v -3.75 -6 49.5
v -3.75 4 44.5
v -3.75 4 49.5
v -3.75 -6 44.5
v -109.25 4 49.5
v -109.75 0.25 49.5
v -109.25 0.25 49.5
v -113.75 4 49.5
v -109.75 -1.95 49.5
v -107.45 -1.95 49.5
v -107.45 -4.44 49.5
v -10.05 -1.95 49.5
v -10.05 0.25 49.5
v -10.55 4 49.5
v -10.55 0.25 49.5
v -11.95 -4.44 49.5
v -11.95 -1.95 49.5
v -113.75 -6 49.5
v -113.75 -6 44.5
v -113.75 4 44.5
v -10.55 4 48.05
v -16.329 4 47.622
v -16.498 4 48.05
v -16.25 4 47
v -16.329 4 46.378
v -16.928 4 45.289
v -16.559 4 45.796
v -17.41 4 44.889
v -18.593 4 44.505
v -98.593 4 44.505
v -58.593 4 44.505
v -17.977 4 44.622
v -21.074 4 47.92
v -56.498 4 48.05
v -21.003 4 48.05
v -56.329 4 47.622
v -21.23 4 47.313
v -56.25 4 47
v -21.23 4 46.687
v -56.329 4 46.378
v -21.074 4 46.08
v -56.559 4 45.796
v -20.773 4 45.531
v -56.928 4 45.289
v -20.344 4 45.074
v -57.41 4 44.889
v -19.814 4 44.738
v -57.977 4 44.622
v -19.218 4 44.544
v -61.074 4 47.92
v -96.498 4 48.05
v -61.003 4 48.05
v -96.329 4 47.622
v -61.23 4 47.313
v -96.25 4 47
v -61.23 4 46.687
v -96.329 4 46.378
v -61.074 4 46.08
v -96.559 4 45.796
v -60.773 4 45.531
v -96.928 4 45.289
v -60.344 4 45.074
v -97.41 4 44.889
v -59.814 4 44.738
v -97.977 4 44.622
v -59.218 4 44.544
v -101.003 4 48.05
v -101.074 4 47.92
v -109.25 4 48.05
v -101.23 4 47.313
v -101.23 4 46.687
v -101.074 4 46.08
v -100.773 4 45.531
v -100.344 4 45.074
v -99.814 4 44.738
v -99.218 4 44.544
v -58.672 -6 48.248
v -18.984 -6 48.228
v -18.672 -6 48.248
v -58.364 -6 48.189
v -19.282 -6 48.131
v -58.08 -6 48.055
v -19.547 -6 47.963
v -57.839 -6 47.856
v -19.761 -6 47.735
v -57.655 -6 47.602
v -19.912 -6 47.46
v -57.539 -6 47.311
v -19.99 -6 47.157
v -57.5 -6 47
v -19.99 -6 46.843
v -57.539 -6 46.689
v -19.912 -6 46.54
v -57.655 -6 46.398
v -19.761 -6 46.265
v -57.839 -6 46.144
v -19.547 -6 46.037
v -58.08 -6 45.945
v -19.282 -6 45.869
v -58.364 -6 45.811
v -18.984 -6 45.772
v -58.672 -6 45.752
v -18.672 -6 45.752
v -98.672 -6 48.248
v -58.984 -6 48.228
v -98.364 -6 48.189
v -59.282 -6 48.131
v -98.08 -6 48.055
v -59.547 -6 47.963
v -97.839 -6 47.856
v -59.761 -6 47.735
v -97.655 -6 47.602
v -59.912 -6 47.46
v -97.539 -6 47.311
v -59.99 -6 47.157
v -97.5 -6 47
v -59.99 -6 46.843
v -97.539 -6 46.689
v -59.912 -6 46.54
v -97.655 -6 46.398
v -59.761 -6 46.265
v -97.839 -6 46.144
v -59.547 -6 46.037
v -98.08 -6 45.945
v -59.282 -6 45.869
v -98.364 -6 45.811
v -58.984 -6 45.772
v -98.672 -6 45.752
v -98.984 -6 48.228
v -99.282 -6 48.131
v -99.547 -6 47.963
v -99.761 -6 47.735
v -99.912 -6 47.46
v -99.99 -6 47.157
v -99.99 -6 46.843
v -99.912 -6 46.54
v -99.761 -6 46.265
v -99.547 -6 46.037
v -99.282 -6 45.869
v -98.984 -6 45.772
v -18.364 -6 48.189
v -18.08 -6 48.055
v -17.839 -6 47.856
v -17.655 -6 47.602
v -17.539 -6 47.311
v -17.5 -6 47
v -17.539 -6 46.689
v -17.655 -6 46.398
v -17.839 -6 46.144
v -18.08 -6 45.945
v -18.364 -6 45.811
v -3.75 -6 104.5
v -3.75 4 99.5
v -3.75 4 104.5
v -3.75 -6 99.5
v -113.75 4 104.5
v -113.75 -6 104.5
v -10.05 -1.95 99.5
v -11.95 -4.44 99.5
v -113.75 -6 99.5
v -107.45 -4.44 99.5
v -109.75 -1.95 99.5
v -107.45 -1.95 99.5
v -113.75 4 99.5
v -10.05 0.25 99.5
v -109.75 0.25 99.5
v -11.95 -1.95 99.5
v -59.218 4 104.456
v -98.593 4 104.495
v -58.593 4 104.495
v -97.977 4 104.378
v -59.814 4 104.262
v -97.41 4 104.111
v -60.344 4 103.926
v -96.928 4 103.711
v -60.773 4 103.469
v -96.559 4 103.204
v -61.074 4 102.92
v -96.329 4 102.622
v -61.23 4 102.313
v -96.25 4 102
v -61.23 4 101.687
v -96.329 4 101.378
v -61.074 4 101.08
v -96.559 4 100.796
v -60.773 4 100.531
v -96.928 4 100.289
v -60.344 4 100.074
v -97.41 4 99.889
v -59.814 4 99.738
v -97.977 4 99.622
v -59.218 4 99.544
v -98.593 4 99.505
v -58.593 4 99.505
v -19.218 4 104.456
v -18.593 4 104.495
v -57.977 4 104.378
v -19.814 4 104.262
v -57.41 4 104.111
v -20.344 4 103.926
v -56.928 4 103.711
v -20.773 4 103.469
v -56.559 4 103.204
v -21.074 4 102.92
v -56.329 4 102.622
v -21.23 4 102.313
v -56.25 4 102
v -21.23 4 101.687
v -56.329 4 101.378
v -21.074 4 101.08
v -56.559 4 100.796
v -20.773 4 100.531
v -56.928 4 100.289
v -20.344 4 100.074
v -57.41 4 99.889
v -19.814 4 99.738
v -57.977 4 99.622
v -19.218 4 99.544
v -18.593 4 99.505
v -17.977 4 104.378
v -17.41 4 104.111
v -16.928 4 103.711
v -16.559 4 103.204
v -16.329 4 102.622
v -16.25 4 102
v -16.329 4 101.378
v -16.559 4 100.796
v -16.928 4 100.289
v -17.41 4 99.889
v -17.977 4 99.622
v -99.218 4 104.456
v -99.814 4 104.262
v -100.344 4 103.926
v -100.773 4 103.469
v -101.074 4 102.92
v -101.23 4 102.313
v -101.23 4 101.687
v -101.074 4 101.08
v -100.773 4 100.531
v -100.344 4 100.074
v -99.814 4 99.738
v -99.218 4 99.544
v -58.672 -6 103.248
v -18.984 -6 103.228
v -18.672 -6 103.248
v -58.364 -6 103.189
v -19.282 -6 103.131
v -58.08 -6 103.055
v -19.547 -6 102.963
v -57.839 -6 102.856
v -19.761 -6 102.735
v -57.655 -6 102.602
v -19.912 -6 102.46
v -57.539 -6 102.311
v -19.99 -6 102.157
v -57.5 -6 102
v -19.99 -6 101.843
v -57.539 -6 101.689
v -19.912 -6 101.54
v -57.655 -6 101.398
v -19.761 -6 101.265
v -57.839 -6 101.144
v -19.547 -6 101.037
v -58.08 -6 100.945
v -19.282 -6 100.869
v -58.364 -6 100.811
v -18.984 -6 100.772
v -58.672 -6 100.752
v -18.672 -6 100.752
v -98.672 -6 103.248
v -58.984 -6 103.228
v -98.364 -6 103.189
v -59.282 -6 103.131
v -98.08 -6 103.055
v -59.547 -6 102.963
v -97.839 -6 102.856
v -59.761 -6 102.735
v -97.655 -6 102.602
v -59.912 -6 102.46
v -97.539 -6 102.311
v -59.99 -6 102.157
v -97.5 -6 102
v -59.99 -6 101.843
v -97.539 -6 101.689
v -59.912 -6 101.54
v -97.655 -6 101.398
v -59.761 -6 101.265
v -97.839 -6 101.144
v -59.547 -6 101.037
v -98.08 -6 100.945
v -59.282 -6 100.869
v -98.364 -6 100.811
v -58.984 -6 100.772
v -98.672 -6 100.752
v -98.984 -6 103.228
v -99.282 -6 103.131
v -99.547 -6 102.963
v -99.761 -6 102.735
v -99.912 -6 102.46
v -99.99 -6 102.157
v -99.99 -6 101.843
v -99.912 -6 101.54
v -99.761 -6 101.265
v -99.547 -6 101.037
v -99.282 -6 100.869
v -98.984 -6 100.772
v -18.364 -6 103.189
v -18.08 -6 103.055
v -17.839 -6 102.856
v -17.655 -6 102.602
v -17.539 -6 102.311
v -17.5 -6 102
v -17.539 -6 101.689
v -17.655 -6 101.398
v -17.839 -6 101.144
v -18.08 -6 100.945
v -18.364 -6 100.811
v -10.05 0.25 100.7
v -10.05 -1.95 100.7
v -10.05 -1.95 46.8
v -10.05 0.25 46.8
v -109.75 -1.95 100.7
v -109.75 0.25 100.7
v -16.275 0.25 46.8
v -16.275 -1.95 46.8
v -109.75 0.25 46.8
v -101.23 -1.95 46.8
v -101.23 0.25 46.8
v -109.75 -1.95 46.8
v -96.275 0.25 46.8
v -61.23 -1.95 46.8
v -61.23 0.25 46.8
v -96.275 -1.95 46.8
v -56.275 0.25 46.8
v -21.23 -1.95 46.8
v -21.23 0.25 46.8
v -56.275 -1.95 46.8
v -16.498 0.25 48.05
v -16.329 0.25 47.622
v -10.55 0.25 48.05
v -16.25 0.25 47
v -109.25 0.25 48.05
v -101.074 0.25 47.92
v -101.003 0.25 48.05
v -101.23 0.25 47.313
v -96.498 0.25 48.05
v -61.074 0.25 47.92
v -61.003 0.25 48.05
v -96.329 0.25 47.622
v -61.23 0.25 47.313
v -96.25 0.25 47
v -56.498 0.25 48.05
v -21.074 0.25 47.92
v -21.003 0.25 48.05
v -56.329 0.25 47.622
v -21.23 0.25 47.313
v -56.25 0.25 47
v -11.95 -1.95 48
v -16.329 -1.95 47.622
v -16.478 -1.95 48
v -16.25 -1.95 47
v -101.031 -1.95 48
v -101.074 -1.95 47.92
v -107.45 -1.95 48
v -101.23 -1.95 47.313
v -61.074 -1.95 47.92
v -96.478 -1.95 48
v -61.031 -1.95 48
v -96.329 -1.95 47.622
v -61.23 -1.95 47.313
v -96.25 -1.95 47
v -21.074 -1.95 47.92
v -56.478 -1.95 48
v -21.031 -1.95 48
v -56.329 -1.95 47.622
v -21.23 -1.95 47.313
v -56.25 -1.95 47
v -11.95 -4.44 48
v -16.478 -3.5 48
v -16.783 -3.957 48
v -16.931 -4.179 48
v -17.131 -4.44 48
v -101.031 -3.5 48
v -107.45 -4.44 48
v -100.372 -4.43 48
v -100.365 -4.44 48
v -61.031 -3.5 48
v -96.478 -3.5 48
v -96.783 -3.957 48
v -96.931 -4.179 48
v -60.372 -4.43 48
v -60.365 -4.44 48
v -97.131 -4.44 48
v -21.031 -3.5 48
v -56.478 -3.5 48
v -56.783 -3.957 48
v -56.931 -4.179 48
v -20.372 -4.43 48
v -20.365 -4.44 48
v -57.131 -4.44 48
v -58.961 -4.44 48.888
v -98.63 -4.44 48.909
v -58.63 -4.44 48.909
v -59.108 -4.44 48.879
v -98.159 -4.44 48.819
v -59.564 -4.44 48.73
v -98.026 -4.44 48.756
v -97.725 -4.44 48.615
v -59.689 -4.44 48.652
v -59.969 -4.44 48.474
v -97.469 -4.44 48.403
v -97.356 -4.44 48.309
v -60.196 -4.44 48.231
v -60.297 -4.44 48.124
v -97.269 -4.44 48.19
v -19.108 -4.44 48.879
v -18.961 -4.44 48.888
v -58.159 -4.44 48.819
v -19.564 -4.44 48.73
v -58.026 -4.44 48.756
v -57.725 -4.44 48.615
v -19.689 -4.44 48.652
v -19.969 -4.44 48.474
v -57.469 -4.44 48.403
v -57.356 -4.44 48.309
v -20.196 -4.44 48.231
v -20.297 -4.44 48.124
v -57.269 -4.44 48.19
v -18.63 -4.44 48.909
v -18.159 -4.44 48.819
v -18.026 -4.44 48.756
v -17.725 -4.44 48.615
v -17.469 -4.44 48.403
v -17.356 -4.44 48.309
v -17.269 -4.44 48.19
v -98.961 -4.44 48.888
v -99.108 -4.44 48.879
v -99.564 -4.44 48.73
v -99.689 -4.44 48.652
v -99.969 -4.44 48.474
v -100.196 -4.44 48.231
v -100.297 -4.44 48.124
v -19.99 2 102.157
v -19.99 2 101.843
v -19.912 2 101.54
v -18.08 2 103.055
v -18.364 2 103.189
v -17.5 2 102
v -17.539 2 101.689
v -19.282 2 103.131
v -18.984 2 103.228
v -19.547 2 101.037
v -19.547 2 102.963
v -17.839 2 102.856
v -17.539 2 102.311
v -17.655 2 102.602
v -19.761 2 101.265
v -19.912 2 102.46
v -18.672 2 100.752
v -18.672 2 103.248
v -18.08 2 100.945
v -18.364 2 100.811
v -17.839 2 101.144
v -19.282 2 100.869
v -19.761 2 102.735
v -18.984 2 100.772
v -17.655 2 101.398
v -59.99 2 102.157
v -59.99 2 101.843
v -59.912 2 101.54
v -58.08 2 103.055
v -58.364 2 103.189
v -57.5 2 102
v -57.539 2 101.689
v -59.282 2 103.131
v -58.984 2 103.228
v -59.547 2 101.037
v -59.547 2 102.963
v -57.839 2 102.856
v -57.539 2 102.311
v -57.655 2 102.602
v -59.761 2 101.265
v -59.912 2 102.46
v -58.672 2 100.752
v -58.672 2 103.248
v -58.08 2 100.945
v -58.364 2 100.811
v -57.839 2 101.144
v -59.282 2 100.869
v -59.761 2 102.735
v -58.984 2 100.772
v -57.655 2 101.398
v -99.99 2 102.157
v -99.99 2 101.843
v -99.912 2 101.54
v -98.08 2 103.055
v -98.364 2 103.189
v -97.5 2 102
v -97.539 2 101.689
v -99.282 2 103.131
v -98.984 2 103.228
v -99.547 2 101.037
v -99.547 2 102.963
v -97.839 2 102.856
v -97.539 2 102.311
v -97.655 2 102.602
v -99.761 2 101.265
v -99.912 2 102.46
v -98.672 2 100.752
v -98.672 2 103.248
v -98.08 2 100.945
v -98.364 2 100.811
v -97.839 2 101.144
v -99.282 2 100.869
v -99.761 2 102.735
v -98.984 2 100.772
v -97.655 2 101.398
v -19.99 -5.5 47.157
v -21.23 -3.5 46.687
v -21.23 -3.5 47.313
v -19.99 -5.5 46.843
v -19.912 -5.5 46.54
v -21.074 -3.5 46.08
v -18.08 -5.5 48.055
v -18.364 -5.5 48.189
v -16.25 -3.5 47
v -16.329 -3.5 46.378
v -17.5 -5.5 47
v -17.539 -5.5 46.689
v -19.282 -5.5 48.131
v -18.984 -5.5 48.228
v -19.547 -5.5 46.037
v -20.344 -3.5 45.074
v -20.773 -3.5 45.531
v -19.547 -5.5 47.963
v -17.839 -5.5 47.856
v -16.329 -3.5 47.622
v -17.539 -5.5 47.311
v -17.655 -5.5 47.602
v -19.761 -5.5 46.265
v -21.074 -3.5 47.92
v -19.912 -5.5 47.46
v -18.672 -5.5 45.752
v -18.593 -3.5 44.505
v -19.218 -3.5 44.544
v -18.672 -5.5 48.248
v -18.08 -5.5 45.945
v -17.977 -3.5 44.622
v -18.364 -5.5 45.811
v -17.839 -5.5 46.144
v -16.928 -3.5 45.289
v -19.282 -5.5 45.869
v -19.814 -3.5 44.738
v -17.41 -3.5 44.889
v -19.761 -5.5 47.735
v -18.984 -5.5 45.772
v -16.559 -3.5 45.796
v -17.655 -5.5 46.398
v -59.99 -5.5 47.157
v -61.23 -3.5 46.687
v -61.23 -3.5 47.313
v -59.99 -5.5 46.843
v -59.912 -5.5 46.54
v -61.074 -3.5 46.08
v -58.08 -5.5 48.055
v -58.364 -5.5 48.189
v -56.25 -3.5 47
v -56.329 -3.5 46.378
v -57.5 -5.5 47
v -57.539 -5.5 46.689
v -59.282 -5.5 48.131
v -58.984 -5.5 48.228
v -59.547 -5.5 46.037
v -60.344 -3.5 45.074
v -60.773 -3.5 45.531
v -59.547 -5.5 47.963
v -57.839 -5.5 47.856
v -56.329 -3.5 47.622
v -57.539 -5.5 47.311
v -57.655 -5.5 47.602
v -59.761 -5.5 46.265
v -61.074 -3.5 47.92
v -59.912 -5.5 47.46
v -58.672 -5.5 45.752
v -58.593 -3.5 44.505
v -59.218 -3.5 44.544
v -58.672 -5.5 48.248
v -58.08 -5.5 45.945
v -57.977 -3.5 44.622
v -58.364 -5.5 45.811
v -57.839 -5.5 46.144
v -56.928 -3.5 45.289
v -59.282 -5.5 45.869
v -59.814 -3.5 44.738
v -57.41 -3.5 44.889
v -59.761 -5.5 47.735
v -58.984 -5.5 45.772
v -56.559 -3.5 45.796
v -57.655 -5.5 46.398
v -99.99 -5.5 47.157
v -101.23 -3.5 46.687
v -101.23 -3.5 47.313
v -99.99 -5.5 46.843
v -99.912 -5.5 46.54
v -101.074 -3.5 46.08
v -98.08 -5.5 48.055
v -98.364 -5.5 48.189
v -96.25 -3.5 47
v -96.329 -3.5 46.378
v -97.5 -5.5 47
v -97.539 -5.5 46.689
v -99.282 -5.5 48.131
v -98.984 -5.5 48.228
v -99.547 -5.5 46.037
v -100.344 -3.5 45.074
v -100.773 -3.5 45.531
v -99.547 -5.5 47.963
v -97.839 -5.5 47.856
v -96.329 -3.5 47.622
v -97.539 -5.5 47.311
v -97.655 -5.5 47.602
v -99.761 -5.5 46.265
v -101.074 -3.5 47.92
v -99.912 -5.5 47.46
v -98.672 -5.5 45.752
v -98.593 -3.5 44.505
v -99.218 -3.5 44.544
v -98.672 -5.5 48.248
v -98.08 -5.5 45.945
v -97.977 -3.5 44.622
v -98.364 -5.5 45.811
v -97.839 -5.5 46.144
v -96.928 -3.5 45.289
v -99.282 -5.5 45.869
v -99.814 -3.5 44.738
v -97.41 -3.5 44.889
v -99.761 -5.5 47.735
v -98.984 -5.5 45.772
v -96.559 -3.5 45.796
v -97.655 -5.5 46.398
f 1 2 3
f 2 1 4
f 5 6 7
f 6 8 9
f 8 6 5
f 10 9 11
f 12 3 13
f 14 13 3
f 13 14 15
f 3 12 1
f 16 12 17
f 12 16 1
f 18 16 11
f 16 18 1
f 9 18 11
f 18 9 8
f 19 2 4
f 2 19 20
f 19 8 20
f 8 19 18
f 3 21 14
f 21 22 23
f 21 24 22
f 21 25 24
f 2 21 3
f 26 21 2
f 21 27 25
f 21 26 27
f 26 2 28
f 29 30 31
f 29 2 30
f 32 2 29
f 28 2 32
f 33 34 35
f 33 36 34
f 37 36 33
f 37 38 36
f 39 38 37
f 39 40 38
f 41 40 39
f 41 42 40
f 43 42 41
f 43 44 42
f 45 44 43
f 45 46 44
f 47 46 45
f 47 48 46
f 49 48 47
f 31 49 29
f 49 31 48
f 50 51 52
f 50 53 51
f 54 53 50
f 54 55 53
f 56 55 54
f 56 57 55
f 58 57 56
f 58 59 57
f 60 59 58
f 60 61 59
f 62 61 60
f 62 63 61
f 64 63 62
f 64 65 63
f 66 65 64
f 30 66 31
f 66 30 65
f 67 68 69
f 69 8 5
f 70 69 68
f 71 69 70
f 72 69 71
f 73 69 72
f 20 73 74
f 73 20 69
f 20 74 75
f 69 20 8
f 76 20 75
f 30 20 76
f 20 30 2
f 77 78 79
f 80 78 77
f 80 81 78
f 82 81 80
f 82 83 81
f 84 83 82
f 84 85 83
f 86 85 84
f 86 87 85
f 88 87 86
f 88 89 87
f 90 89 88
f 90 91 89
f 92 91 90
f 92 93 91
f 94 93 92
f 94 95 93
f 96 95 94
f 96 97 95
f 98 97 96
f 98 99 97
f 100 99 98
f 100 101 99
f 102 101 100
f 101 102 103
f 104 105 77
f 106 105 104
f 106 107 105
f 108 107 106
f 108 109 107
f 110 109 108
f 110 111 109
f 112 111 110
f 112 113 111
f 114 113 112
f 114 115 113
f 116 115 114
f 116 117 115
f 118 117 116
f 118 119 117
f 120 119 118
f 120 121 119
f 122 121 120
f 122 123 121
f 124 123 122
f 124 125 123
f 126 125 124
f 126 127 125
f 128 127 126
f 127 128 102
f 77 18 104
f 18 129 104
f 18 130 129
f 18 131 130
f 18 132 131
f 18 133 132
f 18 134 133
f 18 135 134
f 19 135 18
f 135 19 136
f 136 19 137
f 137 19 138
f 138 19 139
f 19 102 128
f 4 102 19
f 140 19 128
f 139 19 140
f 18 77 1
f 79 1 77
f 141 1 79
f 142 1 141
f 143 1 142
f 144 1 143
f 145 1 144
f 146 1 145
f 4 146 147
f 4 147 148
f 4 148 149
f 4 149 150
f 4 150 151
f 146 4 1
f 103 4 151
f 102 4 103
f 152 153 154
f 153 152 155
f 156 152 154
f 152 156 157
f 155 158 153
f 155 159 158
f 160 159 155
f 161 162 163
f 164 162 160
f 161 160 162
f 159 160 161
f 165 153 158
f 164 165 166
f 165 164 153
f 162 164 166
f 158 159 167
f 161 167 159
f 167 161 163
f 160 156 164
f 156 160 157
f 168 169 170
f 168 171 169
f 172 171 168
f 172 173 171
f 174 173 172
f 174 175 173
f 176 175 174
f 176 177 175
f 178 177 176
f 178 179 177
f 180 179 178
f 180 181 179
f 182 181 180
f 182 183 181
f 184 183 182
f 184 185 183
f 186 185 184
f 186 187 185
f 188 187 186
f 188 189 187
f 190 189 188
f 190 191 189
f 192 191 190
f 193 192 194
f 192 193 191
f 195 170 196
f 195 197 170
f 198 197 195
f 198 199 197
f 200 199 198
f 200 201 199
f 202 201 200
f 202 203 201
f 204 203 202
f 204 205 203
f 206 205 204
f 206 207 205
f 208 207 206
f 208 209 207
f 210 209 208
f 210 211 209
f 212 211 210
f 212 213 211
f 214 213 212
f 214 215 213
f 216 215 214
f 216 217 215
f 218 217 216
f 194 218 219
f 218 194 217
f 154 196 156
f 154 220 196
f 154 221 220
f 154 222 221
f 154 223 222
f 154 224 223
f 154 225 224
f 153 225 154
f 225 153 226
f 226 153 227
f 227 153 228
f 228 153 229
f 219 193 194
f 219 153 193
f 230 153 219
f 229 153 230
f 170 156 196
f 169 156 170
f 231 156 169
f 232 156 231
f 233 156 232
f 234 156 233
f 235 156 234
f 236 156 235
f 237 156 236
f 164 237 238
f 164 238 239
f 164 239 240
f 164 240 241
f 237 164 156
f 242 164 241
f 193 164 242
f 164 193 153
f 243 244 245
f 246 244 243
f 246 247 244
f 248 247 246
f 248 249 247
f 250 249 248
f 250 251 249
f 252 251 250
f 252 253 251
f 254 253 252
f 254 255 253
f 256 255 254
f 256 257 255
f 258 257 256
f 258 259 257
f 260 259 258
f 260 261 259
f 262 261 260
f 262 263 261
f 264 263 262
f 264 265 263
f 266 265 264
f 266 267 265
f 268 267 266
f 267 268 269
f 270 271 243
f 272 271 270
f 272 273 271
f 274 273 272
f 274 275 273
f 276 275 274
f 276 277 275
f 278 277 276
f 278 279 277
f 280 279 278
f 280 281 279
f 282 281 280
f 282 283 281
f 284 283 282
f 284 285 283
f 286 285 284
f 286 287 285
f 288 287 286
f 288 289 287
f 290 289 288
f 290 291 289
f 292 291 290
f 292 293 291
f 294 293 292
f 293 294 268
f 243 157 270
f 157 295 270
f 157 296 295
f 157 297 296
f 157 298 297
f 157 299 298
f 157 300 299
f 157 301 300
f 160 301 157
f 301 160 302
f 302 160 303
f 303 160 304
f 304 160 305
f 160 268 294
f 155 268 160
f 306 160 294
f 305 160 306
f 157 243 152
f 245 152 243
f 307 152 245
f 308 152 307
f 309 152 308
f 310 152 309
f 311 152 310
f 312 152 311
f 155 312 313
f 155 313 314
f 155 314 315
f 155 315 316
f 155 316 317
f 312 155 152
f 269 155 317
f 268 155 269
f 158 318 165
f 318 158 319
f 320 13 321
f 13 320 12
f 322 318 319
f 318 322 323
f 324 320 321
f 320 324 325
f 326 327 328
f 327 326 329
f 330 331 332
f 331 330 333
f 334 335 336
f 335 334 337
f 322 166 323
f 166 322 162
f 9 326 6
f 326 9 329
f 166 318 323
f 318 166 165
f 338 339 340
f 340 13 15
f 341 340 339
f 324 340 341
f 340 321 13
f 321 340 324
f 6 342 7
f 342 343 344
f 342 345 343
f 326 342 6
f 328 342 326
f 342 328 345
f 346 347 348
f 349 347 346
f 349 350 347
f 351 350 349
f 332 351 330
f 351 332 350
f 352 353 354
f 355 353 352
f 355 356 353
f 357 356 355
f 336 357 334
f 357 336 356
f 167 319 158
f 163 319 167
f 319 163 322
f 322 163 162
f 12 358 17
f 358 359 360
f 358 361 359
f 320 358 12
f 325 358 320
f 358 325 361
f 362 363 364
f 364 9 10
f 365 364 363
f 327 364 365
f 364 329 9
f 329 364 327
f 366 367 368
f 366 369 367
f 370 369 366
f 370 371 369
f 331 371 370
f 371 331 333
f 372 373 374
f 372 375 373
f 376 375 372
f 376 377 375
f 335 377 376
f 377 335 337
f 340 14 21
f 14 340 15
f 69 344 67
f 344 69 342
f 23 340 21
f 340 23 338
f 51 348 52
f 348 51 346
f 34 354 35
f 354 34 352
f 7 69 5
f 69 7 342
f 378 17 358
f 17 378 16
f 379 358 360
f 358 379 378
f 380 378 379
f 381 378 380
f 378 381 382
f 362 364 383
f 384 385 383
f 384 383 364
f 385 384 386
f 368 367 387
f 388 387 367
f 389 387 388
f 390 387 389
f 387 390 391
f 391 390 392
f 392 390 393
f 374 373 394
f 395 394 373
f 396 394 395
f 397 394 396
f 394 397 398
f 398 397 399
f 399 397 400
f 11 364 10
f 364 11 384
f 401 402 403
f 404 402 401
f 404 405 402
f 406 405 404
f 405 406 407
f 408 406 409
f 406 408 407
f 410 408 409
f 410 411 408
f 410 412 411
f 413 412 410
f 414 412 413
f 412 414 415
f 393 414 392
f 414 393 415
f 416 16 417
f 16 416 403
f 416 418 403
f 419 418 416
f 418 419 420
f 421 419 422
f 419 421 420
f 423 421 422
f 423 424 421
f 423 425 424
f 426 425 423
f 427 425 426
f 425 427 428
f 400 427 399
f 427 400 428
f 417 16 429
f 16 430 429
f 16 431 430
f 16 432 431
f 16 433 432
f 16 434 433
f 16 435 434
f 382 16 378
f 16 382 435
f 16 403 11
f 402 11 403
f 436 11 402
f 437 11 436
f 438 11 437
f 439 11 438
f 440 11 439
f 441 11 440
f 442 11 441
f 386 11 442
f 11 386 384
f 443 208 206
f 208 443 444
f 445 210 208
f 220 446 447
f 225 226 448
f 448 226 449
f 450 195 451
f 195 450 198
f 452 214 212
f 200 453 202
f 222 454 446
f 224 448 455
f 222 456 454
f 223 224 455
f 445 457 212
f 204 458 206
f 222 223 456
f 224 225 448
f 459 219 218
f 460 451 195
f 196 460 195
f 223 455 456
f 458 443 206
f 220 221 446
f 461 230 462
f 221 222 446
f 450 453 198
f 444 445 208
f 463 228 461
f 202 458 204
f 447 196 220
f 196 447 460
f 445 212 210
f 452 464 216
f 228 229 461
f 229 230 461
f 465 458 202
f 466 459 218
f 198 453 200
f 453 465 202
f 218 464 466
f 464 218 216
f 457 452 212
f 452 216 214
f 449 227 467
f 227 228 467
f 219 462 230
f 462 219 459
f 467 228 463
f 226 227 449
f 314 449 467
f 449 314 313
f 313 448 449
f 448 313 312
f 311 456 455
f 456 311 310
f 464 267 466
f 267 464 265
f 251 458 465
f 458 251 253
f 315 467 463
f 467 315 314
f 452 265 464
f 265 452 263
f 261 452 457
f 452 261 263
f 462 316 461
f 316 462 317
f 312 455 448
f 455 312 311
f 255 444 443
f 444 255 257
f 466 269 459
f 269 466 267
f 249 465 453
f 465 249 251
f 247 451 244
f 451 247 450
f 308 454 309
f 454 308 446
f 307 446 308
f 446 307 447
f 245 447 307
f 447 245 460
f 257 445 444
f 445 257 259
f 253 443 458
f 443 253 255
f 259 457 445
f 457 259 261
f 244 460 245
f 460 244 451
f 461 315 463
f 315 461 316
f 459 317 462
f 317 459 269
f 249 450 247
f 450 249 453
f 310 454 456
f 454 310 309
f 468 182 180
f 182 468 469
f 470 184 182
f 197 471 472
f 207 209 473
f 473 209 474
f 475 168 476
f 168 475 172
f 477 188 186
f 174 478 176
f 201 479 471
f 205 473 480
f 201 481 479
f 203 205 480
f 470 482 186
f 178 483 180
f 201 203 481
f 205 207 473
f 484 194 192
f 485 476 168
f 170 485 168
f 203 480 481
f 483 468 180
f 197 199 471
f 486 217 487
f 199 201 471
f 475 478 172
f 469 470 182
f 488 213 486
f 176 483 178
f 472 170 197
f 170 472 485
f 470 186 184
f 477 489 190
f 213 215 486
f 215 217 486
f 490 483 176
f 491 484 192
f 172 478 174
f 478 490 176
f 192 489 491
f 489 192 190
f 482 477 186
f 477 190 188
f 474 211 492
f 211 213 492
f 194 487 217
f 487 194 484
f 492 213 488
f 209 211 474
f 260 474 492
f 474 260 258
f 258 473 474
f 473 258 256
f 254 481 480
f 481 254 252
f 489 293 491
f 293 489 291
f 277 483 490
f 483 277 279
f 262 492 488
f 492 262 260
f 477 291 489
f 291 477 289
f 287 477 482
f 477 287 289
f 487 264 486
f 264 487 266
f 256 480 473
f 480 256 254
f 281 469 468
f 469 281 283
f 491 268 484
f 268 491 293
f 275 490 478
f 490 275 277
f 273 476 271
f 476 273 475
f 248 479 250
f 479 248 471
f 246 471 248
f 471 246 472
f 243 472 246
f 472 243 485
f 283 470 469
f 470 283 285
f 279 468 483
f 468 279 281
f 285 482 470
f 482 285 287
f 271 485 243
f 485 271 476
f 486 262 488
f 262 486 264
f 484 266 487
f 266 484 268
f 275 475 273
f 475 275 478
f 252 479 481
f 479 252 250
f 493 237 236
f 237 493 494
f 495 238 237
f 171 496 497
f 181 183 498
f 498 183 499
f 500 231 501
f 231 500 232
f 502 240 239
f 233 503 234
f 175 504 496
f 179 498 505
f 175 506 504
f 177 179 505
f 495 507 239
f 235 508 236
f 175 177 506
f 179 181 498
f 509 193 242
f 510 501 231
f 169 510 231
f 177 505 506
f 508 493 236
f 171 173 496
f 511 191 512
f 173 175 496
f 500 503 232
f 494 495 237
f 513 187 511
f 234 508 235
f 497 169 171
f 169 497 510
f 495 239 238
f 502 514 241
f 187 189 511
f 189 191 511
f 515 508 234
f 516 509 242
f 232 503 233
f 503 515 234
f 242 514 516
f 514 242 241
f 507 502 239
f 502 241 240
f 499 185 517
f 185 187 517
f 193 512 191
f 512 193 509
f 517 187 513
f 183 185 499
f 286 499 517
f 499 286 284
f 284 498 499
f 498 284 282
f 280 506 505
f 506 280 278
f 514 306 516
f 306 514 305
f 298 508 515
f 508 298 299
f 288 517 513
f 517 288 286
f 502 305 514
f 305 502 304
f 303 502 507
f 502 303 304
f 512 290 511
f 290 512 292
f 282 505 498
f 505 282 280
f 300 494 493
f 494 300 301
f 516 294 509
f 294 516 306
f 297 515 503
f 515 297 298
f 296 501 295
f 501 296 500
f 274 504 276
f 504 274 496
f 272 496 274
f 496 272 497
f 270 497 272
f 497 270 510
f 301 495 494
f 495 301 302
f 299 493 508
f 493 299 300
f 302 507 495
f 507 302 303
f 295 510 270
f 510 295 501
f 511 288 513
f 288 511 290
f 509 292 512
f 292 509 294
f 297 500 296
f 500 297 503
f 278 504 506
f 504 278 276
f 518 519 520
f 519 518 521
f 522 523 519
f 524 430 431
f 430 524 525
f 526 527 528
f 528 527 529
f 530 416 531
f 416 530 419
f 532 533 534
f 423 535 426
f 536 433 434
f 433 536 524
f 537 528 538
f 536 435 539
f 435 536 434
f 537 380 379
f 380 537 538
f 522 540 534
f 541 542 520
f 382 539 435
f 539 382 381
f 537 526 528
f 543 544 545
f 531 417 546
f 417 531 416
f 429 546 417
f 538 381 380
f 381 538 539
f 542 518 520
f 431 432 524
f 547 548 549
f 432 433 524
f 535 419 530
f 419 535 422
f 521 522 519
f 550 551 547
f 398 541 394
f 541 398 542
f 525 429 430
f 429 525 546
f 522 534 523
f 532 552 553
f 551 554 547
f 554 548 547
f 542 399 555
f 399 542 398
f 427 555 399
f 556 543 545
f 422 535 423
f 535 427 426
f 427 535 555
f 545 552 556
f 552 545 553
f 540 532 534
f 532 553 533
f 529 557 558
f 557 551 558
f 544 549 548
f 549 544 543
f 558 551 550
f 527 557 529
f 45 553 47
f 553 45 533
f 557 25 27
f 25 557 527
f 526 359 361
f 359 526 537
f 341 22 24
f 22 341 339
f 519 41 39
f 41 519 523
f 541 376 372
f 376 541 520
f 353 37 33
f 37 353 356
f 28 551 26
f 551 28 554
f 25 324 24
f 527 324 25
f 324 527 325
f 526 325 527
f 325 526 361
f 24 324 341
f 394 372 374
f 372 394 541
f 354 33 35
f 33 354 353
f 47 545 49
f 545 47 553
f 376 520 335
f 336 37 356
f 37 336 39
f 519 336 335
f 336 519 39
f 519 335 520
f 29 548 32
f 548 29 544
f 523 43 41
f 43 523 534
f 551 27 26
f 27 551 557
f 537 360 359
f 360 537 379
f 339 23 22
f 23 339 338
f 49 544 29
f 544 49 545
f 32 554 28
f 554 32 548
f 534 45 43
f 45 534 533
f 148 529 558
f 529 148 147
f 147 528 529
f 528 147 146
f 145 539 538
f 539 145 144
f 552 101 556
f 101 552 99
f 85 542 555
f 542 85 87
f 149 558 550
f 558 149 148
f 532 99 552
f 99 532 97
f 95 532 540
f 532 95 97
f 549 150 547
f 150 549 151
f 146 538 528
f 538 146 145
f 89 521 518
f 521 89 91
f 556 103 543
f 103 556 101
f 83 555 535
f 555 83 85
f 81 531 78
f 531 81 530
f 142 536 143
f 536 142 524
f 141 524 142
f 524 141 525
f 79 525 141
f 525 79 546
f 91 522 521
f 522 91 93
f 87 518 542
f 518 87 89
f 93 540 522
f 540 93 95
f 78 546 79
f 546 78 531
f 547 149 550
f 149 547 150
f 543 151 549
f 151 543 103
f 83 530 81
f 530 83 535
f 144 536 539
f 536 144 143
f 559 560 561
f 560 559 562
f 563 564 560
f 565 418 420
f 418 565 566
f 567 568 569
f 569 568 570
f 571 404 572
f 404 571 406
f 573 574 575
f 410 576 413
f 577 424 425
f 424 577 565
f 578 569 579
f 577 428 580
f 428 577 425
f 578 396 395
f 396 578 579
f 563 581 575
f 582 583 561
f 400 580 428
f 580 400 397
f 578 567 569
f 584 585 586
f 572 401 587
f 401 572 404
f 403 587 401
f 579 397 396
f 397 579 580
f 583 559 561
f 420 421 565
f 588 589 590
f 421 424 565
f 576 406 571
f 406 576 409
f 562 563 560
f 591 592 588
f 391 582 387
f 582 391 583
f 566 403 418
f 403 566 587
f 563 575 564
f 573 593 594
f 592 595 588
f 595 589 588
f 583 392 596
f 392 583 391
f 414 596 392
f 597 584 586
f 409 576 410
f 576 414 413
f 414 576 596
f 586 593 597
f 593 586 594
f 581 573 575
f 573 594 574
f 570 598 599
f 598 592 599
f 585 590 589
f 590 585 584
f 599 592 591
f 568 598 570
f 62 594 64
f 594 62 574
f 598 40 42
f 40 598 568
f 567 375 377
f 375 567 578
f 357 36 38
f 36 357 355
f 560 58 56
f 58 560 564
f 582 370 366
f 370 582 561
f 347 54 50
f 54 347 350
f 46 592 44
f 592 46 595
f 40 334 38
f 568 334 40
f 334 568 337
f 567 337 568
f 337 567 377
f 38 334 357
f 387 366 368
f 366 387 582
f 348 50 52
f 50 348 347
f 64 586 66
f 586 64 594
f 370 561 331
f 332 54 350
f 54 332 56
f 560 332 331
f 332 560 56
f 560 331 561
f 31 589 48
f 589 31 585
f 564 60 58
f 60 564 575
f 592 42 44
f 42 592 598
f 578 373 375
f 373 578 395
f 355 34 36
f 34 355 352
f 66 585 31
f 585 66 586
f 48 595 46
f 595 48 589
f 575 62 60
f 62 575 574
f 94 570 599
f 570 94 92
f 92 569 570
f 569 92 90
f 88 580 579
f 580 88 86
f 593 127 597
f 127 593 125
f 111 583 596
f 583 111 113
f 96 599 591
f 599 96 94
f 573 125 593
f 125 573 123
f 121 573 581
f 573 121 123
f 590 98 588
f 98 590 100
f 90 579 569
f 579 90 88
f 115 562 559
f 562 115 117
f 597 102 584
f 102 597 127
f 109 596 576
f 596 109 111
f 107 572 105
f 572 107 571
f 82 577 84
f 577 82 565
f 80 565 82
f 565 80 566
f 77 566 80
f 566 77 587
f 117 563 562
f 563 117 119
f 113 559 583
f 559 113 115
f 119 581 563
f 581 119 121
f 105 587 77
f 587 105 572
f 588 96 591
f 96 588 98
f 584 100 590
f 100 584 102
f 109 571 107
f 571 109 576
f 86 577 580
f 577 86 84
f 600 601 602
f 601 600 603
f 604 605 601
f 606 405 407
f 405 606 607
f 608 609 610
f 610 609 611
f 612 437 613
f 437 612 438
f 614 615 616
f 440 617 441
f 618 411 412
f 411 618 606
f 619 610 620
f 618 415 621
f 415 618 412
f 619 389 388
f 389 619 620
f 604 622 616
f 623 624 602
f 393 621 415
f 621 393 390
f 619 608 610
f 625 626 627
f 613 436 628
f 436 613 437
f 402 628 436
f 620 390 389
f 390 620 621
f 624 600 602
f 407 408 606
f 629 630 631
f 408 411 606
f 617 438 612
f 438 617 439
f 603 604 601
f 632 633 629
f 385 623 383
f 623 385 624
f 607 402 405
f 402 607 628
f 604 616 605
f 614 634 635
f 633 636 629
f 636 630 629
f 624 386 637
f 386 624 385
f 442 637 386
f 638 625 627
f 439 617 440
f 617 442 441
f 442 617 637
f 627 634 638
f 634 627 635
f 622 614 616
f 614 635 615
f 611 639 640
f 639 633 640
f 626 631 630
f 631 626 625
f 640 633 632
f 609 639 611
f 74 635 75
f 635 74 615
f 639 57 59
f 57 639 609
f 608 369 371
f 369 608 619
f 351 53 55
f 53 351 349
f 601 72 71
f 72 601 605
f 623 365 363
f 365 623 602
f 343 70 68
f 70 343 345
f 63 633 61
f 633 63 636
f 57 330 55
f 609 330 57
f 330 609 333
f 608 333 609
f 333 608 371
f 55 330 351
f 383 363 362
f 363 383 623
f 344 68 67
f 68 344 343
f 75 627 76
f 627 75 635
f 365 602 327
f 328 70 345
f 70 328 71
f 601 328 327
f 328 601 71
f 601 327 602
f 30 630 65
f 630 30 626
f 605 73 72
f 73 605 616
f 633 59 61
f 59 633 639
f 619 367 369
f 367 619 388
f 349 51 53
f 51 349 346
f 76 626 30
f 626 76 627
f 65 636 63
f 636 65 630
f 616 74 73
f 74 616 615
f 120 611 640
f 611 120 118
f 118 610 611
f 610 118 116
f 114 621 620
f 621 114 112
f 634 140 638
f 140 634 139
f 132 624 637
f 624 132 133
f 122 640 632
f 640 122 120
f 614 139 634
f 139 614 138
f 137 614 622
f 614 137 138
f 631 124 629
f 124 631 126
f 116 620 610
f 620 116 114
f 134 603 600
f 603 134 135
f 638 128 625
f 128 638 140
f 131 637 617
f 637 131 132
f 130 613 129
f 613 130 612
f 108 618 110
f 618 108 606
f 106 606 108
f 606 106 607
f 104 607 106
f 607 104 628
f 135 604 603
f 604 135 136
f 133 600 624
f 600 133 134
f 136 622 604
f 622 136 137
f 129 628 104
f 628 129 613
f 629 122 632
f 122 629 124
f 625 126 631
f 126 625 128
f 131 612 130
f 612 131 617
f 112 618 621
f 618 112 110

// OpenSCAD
// file: openscad-extra/src/countersink.scad
/*
Countersink depression for tapered screw heads.
*/

module make_countersink(d1=0, d2=0, h=0, outer=10, inner=0, $fn=25){
    /*
    d1 = shaft diameter
    d2 = head diameter
    h = height of taper
    outer = height of head mass
    inner = height of shaft mass, including taper
    */
    default_taper_height = 2;
    d1 = d1 ? d1 : 2.5;
    d2 = d2 ? d2 : 5;
    h = h ? h : default_taper_height;
    inner = (inner ? inner : 10) - default_taper_height;
    
    translate([0, 0, -default_taper_height/2])
    union(){
        
        // taper
        cylinder(d1=d1, d2=d2, h=h, center=true, $fn=$fn);
    
        // big top
    	translate([0, 0, h/2])
    	cylinder(d=d2, h=outer, center=false, $fn=$fn);
        
    	// lower bottom
    	translate([0, 0, -h/2-inner])
    	cylinder(d=d1, h=inner, center=false, $fn=$fn);
	}
}

make_countersink(inner=10);

color("blue")
translate([0,2,0])
cylinder(d=2.5, h=20, center=true, $fn=100);
// main file
use <openscad-extra/src/countersink.scad>;

// mega needs 3mm of clearance below it
module arduino_mega_mount(){
    difference(){
        for(i=[-1:2:1])
        translate([0,7.5,(25+2.5)*i])
        cube([110,10,5], center=true);
        
        translate([-1.15,7.65,-.75])
        color("orange")
        arduino_mega_board(buffer=0.5);

        color("red"){
            // top mount holes
            for(i=[0:2])
            translate([40-40*i,12.5,30-2.5])
            rotate([-90,0,0])
            make_countersink(d1=2.5, d2=5, inner=20);
            
            // bottom mount holes
            for(i=[0:2])
            translate([40-40*i,5,-(30-2.5)])
            rotate([-90,0,0])
            make_countersink(d1=2.5, d2=5, inner=20);
        }
    }
    
}

module arduino_mega_board(buffer=0){
    // main board
    color("green")
    cube([99.2+buffer,1.7+buffer,53.4+buffer], center=true);
    
    // electronics bounding box
    color("red")
    translate([0,6,0])
    cube([99.2-3+2+buffer,1.7+10.5+buffer,53.4-3+0.5+buffer], center=true);
    
    // bottom elec bb
    color("red")
    translate([2-1.8,-2.86+1/2+0.02,0])
    cube([95+buffer,2+buffer,50.5+0.5+buffer], center=true);
}

//mega_offset_y = -4; // flush
//mega_offset_y = -4+3; // minimum clearance
mega_offset_y = -4+4; // minimum clearance + extra for screw

if(0){
color("gray")
translate([-109.5,mega_offset_y,100])
rotate([-90,0,0])
import("electronics/arduino-mega-2560/Arduino_MEGA2560.stl");

translate([-109.5+99.2/2,-1.7/2+mega_offset_y,100-53.4/2])
arduino_mega_board(buffer=0.5);
}

if(0)
color("blue")
translate([-58.75, -66-5+55+5+2.5, 4.5+70])
//pelvis_cross_support();
rotate([90,0,0])
import("printable/pelvis_cross_support.stl");

translate([-58.75, -66-5+55+5+2.5, 4.5+70])
arduino_mega_mount();
